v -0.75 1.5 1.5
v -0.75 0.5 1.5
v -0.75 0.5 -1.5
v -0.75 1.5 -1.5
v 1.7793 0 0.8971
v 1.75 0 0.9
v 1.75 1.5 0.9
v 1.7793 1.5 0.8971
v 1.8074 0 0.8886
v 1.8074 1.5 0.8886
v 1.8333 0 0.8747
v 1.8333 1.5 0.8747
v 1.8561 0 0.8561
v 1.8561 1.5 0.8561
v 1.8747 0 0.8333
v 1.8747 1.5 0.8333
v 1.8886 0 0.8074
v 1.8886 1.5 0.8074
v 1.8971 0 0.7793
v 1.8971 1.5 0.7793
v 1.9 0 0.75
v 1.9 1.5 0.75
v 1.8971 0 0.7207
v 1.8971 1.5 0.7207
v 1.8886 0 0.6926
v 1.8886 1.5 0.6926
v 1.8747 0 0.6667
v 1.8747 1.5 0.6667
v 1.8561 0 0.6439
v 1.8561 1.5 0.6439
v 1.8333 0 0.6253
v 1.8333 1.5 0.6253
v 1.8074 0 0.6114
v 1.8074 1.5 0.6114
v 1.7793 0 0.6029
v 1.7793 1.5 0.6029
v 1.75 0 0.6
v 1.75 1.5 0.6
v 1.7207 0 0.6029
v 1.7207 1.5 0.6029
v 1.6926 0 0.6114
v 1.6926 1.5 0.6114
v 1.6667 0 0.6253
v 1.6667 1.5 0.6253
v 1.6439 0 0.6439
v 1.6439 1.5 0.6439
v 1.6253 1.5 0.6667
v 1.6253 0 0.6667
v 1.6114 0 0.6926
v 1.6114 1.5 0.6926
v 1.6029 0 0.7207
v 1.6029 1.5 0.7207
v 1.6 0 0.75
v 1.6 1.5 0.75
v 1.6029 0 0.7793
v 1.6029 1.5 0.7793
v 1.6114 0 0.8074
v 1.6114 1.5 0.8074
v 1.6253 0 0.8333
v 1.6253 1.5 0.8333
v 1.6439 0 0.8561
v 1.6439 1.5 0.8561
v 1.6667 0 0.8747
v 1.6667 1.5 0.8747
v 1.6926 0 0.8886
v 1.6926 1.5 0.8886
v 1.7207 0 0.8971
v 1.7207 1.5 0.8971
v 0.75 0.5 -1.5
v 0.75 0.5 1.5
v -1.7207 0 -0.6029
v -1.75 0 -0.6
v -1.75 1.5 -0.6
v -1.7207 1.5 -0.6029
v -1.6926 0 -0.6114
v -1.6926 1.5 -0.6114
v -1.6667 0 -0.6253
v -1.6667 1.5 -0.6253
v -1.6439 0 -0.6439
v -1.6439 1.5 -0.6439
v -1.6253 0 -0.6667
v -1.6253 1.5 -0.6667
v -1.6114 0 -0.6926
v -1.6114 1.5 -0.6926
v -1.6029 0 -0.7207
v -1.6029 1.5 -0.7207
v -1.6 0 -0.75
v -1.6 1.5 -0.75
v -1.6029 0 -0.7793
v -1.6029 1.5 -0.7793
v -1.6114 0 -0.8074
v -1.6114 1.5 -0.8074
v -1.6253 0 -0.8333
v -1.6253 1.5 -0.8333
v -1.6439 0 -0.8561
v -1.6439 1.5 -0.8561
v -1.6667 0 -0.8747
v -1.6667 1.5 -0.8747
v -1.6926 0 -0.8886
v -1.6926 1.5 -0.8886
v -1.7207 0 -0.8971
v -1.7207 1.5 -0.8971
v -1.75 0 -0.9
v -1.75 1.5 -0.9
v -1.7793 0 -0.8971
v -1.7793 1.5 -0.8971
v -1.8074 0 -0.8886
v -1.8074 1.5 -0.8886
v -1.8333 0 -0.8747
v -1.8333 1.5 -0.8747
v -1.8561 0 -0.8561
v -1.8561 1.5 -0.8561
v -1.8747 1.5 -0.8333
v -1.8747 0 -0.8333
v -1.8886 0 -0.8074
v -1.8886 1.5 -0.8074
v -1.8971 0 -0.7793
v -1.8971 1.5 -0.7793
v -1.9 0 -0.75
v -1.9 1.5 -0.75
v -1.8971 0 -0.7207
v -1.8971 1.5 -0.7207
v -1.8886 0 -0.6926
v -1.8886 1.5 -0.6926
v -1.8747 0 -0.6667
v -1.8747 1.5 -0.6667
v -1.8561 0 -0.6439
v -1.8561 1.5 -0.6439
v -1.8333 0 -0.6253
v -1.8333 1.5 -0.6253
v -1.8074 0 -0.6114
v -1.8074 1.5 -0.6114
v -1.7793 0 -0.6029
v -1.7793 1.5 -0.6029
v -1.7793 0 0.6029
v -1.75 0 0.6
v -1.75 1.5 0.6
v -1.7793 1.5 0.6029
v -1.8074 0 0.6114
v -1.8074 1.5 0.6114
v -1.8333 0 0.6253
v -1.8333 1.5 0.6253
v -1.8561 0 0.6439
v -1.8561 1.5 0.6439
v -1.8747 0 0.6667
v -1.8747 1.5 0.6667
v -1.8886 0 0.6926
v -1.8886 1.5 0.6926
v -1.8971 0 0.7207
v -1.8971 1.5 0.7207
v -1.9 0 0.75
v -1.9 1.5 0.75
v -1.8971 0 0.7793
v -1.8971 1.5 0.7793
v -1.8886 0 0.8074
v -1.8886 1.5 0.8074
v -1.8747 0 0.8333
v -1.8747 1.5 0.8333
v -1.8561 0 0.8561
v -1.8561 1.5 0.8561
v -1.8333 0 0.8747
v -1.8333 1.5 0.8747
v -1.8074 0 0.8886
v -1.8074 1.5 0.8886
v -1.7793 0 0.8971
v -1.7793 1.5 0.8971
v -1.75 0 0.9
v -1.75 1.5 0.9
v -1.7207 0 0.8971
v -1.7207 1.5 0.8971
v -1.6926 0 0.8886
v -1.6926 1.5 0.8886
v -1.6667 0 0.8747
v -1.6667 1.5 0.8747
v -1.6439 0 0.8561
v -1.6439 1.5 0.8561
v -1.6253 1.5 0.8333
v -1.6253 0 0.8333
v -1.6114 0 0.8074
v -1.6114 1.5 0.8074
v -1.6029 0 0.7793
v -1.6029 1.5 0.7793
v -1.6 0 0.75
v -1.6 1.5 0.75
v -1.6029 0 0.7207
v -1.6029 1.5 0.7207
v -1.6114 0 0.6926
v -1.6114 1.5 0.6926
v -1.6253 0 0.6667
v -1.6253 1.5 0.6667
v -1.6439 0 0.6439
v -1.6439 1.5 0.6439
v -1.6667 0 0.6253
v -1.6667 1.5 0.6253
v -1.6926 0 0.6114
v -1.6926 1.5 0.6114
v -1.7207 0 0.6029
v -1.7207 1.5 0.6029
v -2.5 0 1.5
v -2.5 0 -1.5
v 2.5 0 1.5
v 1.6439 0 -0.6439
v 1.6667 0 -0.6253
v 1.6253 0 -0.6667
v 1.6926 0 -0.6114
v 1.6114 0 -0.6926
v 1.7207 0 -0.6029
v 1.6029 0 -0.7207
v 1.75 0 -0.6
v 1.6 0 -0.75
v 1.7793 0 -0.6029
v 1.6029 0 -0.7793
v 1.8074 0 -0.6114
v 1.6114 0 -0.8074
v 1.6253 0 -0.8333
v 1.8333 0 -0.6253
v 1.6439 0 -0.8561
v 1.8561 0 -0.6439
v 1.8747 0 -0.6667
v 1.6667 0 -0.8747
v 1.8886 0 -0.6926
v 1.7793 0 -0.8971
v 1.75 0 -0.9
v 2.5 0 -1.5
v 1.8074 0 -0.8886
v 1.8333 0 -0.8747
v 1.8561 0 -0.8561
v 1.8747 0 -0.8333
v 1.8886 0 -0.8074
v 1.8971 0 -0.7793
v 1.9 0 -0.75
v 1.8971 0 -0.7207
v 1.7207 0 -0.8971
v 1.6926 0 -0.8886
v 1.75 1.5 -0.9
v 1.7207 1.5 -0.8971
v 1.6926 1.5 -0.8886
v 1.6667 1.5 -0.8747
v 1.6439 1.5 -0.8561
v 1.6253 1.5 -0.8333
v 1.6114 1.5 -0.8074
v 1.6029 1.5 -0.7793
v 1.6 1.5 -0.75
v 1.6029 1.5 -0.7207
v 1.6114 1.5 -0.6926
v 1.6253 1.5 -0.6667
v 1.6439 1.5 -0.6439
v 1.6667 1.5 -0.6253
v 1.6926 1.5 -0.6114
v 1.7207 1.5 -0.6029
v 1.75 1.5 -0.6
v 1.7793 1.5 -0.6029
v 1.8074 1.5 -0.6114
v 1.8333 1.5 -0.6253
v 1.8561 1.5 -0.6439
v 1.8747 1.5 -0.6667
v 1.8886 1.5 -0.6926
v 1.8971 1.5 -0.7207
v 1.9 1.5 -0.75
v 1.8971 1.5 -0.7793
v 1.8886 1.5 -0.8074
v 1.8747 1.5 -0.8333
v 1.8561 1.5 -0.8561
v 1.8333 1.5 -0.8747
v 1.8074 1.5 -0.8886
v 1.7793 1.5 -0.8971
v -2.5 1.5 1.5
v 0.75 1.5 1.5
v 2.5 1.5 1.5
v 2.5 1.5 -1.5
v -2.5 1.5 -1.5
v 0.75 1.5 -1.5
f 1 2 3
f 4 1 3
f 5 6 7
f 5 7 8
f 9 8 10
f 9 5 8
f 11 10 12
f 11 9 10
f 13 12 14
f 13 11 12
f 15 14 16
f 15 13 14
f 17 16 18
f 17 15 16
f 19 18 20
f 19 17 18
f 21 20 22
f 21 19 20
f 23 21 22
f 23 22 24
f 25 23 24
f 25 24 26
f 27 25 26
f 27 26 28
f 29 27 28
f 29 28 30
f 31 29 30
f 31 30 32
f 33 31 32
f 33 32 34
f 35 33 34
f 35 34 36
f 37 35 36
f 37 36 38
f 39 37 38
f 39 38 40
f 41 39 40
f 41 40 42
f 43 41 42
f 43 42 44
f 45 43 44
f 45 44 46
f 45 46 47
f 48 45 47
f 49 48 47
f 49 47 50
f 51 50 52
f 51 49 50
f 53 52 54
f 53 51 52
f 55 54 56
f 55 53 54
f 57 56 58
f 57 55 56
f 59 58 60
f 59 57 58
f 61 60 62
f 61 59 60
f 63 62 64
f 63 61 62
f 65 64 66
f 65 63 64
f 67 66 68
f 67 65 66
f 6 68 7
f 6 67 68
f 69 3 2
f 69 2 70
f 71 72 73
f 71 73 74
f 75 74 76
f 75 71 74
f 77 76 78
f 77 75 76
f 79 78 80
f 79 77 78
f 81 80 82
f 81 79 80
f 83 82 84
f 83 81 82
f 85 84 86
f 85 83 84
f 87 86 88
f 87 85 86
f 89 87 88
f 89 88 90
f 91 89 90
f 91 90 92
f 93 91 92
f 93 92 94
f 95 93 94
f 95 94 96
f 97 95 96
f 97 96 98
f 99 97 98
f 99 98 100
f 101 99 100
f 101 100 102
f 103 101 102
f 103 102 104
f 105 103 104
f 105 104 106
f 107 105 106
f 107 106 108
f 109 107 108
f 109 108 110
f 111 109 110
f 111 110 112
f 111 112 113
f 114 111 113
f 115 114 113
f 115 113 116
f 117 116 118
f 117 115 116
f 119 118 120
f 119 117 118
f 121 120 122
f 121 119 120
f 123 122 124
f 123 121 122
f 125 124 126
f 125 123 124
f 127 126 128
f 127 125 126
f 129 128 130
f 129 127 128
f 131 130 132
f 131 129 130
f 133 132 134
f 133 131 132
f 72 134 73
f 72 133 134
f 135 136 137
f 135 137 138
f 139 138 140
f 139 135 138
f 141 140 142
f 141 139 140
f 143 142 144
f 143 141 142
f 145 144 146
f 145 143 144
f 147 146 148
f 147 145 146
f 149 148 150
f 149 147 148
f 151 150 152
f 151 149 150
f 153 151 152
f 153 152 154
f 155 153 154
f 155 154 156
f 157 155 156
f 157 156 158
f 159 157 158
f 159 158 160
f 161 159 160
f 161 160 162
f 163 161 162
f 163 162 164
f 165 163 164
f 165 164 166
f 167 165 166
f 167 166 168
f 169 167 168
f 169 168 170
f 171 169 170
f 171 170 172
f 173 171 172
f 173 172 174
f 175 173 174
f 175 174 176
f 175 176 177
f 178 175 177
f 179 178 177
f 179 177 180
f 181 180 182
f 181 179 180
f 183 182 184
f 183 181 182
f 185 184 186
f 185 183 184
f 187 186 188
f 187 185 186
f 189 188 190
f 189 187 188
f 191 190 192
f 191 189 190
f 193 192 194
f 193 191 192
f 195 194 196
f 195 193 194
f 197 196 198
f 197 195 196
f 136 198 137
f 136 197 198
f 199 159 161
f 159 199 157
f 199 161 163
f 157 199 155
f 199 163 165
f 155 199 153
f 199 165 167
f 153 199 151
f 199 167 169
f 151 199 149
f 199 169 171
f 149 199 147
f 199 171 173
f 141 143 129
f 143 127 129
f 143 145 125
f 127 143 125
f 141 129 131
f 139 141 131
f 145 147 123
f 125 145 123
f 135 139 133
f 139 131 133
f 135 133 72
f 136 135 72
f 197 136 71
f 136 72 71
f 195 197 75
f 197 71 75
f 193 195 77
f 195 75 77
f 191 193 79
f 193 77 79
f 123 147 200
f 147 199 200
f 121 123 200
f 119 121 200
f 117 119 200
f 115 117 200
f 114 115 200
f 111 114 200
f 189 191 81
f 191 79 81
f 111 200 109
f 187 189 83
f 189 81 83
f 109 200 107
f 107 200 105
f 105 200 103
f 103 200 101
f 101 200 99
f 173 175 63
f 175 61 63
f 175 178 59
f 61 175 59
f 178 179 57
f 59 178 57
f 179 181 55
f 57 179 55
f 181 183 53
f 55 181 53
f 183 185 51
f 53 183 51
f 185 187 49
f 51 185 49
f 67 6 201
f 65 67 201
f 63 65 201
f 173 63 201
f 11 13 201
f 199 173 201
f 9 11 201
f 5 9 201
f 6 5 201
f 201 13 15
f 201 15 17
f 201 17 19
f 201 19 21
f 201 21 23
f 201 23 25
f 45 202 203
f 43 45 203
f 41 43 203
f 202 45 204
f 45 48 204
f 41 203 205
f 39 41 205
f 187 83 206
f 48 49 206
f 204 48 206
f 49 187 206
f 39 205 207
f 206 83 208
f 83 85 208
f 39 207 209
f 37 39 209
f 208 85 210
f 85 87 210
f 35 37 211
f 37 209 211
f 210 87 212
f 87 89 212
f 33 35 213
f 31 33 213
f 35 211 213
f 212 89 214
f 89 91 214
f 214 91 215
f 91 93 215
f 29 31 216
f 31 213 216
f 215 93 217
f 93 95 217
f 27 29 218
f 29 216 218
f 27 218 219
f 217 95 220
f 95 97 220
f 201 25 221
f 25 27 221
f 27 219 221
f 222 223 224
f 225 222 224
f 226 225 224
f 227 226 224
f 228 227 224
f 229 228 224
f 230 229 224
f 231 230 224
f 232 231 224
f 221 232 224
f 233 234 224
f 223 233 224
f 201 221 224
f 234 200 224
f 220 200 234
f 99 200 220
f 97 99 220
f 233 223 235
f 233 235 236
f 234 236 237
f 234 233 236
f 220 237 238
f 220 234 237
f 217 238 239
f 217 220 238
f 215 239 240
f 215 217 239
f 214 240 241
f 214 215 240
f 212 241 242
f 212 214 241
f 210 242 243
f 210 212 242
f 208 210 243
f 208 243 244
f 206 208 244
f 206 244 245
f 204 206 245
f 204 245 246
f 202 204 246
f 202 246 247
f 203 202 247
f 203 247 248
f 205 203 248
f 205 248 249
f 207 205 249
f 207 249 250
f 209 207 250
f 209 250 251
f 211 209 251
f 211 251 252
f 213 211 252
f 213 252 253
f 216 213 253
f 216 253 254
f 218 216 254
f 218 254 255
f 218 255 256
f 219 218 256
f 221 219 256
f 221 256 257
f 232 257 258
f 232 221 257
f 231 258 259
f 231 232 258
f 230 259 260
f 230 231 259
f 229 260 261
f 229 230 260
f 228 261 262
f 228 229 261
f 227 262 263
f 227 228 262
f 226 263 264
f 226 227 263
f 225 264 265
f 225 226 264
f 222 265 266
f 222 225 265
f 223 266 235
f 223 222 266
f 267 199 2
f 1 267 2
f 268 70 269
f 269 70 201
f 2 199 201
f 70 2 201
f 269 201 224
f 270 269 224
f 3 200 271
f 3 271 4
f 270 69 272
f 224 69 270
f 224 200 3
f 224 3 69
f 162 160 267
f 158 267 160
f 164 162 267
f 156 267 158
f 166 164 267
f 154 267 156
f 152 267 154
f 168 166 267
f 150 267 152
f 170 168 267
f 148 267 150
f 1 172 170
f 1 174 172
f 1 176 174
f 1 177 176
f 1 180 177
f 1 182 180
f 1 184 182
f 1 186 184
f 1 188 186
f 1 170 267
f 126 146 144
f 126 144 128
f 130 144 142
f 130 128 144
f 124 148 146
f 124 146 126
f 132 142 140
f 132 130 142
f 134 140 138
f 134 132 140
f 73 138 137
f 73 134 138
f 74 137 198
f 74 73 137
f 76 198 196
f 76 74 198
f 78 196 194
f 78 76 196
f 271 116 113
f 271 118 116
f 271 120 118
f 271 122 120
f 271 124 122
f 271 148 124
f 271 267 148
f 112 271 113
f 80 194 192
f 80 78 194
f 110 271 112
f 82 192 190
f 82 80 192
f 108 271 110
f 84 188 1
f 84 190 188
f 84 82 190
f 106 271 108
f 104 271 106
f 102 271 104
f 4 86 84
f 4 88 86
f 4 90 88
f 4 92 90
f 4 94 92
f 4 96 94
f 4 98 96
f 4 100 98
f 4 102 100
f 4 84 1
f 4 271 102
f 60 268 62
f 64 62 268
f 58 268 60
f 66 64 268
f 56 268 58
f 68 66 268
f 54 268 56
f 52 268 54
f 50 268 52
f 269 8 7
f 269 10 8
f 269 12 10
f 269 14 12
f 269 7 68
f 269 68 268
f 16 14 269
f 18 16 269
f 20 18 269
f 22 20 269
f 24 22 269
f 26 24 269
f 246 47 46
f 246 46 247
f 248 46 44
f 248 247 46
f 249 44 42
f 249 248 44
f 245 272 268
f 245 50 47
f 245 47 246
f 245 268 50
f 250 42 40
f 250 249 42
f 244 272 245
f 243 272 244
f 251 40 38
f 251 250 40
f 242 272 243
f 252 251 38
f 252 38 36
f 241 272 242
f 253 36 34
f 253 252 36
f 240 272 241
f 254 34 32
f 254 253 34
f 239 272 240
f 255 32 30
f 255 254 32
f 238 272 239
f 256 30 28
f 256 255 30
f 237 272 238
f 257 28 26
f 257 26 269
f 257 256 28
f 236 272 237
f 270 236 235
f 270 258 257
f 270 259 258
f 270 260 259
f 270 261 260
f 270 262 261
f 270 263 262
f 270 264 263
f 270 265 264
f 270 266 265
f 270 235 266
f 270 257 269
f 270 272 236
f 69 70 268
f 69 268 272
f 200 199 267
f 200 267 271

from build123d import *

# Parameters (mm, degrees)
SKETCH2_W               = 5
SKETCH2_H               = 3
BOSS_EXTRUDE1_DEPTH     = 0.5
SKETCH3_W               = 1.75
SKETCH3_H               = 3
BOSS_EXTRUDE2_DEPTH     = 1.5
CUT_EXTRUDE1_DEPTH      = 0.5
CUT_EXTRUDE1_DEPTH_BACK = 4.278719262
CUT_EXTRUDE1_START      = 1
SKETCH4_R               = 0.15


with BuildPart() as part:
    # Sketch2 → Boss-Extrude1 (new body)
    with BuildSketch(Plane(origin=(0, 0, 0), x_dir=(1, 0, 0), z_dir=(0, 1, 0))):
        Rectangle(SKETCH2_W, SKETCH2_H)
    extrude(amount=BOSS_EXTRUDE1_DEPTH)

    # Sketch3 → Boss-Extrude2 (add)
    with BuildSketch(Plane(origin=(0, 0, 0), x_dir=(1, 0, 0), z_dir=(0, 1, 0))):
        with Locations((-1.625, 0)):
            Rectangle(SKETCH3_W, SKETCH3_H)
        with Locations((1.625, 0)):
            Rectangle(SKETCH3_W, SKETCH3_H)
    extrude(amount=BOSS_EXTRUDE2_DEPTH)

    # Sketch4 → Cut-Extrude1 (cut, two sides: drawn at the far end of the back side and taken through both)
    with BuildSketch(Plane(origin=(0, 0, 0), x_dir=(1, 0, 0), z_dir=(0, 1, 0)).offset(CUT_EXTRUDE1_START - CUT_EXTRUDE1_DEPTH_BACK)):
        with Locations(Location((-1.75, 0.75, 0), (0, 0, 270))):
            Circle(SKETCH4_R)
        with Locations(Location((1.75, 0.75, 0), (0, 0, 90))):
            Circle(SKETCH4_R)
        with Locations(Location((1.75, -0.75, 0), (0, 0, 270))):
            Circle(SKETCH4_R)
        with Locations(Location((-1.75, -0.75, 0), (0, 0, 90))):
            Circle(SKETCH4_R)
    extrude(amount=CUT_EXTRUDE1_DEPTH + CUT_EXTRUDE1_DEPTH_BACK, mode=Mode.SUBTRACT)


solid = part.part
